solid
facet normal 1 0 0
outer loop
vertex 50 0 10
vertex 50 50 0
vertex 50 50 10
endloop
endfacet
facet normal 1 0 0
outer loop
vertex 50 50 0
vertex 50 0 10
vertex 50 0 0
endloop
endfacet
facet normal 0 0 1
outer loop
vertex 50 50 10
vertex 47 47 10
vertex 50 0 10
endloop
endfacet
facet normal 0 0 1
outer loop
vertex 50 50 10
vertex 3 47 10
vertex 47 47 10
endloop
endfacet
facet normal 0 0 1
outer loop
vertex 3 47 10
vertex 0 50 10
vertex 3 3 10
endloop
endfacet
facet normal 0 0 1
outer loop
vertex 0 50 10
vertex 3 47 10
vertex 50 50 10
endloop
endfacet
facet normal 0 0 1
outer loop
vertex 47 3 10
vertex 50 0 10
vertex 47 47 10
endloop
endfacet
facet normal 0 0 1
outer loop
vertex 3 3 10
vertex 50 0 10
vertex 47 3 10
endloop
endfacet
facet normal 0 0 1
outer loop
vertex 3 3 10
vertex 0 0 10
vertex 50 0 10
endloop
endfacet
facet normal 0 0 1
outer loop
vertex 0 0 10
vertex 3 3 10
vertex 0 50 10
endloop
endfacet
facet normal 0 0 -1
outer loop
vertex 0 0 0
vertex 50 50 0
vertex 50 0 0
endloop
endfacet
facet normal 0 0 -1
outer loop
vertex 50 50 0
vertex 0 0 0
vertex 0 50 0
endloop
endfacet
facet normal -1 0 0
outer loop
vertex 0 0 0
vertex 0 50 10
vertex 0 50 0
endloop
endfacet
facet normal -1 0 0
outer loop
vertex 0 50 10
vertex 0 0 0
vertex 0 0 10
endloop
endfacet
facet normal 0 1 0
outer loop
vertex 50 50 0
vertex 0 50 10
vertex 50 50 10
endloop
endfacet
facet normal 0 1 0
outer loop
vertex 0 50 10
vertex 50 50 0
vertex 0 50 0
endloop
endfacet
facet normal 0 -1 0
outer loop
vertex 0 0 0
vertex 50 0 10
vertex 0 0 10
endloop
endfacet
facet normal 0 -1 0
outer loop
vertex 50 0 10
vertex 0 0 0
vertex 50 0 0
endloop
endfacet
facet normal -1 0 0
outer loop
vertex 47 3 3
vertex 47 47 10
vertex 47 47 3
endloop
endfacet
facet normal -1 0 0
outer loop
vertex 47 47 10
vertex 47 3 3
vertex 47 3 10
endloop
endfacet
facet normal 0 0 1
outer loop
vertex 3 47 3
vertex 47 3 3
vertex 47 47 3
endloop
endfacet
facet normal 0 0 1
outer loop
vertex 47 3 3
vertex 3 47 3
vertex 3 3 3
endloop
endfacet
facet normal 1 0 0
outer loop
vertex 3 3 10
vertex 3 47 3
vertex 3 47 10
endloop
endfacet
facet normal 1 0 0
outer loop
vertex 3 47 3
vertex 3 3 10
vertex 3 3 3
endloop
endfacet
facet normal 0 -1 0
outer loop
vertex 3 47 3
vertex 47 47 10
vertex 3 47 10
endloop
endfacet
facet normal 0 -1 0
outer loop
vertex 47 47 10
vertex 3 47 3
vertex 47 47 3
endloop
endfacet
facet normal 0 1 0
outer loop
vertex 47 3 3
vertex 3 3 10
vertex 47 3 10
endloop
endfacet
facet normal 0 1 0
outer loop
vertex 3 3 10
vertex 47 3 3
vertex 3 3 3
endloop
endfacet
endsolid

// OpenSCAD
// Generated by HEIDI for job job_1787785167781_09ffacc0
// Product: 3D-Printable Model Preparation Package
// Request: Failure injection test
// Model type: box
// Generated: 2026-09-07T04:35:15.822Z
//
// This is a parameterized OpenSCAD model. You can adjust the
// parameters below to customize the dimensions before rendering.

// ─── Parameters ───
width = 50;       // X dimension in mm
height = 50;     // Y dimension in mm
depth = 10;       // Z dimension in mm
wall = 3;    // wall thickness in mm
$fn = 60;               // facet resolution

// Parametric hollow box
module parametric_box() {
    difference() {
        // Outer shell
        cube([width, height, depth]);
        // Inner cavity
        translate([wall, wall, wall])
            cube([width - wall * 2, height - wall * 2, depth - wall + 1]);
    }
}
parametric_box();
